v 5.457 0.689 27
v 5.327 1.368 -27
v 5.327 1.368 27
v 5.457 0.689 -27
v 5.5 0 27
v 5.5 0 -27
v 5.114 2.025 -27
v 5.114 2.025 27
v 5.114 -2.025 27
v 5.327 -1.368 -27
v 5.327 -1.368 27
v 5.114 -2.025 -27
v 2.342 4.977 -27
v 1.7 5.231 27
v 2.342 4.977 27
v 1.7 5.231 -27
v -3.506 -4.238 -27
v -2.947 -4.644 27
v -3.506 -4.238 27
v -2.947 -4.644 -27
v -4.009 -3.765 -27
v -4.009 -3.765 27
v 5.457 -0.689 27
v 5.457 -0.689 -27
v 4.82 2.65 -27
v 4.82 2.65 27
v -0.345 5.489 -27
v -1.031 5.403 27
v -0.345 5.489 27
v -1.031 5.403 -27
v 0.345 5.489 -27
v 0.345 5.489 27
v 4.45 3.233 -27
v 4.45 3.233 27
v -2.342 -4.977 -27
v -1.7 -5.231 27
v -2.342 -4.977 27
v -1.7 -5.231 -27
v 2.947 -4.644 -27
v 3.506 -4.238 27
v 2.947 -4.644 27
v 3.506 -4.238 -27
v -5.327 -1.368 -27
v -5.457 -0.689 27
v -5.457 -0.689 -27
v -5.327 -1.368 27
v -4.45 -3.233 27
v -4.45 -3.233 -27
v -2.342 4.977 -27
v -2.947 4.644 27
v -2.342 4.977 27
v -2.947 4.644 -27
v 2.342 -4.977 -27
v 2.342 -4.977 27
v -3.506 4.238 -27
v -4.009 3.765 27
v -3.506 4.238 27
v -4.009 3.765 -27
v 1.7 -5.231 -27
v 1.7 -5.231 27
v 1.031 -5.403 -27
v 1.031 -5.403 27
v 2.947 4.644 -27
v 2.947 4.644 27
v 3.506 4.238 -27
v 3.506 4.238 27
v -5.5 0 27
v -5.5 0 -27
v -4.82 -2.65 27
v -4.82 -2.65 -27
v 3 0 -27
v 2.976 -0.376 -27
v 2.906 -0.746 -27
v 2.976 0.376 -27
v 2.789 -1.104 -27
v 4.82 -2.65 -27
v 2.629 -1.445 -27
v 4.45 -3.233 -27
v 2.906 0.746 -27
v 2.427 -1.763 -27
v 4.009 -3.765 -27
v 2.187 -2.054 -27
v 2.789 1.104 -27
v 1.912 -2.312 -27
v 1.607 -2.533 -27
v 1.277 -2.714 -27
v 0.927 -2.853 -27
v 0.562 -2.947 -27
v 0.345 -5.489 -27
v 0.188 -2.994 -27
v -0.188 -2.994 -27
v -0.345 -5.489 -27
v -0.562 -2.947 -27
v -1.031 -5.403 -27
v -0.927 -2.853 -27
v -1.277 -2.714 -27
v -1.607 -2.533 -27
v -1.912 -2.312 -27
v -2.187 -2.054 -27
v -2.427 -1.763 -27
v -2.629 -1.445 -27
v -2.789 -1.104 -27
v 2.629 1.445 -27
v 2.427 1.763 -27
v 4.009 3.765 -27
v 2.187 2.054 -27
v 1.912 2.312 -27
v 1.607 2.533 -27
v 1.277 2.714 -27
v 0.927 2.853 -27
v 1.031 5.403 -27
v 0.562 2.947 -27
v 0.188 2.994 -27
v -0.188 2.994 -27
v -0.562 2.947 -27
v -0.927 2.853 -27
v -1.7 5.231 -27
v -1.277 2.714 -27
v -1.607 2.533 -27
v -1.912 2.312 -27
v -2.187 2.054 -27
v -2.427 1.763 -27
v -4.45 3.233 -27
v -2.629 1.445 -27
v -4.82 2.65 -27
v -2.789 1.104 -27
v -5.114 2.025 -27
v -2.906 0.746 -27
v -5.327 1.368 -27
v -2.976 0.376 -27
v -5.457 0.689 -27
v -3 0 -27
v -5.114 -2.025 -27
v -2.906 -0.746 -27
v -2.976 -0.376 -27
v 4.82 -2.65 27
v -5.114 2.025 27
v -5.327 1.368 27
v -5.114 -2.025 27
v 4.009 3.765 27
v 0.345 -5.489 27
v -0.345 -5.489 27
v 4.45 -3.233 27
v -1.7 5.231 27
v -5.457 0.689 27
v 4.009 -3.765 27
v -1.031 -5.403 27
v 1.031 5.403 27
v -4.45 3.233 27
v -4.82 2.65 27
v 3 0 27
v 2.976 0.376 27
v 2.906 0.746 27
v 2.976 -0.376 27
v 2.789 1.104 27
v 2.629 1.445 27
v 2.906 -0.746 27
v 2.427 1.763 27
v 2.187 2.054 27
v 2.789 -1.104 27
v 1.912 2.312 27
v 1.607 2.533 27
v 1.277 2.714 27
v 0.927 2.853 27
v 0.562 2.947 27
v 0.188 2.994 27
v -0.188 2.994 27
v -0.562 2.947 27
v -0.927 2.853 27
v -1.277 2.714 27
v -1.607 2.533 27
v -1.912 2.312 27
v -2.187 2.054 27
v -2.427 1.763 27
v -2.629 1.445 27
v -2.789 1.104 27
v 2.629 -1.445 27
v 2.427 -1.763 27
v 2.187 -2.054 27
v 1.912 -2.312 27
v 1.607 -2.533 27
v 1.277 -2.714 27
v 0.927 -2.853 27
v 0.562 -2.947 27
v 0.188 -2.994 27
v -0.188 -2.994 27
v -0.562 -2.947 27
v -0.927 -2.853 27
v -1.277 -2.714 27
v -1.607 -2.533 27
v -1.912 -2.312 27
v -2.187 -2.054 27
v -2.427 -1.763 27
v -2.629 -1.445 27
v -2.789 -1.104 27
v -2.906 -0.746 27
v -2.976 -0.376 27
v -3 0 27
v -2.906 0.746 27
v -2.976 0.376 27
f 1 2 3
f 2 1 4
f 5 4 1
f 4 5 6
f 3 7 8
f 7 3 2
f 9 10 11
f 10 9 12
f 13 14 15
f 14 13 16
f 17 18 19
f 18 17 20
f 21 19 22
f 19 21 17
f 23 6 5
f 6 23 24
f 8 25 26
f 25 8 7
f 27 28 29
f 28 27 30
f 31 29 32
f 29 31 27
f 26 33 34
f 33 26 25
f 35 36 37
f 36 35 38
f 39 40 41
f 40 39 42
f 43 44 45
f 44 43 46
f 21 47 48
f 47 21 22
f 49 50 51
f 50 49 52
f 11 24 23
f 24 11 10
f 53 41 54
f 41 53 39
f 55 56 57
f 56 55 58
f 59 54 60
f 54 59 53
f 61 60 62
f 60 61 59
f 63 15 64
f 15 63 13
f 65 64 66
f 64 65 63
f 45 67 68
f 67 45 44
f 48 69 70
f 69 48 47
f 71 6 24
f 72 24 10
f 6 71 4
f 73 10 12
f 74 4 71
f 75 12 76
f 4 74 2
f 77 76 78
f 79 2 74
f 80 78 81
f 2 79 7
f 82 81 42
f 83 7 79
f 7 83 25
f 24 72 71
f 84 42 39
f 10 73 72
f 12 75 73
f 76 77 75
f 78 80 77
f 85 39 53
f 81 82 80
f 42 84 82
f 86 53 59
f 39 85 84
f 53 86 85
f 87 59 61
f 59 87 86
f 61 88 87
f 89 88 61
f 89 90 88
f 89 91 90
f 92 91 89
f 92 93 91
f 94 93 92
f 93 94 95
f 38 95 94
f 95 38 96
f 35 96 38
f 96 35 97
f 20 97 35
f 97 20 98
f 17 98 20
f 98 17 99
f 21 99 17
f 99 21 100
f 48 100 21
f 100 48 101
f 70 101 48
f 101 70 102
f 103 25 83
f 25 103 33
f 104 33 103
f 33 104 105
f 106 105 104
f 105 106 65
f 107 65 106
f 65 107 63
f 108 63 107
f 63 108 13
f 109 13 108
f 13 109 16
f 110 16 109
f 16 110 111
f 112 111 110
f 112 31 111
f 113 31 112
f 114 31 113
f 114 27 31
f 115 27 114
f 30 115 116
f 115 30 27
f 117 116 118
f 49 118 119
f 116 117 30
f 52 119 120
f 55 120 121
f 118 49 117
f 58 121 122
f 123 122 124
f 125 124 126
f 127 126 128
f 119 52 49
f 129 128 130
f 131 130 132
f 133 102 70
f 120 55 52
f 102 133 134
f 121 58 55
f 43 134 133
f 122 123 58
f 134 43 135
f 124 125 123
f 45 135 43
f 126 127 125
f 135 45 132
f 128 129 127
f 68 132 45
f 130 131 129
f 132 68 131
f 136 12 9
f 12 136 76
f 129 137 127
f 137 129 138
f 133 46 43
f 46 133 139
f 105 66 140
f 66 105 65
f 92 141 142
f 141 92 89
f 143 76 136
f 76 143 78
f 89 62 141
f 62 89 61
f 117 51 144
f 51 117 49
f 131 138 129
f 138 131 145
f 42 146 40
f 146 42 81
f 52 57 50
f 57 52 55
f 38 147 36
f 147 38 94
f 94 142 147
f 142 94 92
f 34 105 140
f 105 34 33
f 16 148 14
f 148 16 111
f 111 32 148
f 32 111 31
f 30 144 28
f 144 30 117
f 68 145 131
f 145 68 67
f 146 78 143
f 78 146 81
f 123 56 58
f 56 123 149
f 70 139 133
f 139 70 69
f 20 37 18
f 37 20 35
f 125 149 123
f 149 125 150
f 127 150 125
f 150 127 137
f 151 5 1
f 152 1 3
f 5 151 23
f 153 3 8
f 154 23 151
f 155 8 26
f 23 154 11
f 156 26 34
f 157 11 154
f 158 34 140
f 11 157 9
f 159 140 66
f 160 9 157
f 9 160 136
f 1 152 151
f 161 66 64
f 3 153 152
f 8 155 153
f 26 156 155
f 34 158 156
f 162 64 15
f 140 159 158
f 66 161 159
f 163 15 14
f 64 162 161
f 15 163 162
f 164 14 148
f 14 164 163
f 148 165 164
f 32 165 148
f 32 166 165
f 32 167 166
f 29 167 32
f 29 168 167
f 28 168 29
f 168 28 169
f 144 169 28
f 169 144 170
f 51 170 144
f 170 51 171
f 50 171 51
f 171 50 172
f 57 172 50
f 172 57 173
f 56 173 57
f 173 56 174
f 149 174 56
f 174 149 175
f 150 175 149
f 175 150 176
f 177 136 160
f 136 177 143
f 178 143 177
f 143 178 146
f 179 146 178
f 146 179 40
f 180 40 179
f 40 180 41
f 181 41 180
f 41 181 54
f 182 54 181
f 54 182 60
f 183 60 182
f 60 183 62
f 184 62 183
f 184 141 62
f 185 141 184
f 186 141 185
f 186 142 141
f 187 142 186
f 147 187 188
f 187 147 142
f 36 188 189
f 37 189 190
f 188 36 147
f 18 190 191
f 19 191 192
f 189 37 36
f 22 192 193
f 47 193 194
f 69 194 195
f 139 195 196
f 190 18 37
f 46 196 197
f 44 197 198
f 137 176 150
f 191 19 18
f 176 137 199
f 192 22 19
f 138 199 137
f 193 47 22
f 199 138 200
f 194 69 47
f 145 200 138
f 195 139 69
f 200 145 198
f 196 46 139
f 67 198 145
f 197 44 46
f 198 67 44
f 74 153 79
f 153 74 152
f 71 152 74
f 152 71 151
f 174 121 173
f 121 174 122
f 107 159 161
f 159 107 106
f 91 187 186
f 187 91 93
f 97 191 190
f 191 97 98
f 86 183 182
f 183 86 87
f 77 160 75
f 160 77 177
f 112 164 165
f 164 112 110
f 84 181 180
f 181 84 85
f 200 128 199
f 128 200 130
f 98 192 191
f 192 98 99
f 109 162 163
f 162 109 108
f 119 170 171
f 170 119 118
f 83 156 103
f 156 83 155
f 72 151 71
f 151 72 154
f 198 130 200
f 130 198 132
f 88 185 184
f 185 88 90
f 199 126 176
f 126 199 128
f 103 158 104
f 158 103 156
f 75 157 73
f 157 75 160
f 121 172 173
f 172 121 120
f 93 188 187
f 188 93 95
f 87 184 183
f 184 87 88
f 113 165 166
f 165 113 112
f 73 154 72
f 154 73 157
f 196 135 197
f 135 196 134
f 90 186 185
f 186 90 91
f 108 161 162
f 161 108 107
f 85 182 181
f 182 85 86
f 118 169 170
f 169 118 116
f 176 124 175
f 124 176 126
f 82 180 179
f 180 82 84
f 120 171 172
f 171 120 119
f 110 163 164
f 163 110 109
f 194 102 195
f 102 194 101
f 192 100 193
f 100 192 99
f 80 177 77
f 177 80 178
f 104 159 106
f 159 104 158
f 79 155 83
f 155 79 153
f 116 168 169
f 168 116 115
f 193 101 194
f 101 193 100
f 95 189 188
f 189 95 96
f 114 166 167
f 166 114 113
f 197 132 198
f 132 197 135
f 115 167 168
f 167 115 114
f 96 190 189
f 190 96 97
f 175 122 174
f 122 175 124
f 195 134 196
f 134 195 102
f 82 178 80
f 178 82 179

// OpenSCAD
$fn = 50;


difference() {
	union() {
		translate(v = [0, 0, -27.0000000000]) {
			cylinder(h = 54, r = 5.5000000000);
		}
	}
	union() {
		translate(v = [0, 0, -100.0000000000]) {
			cylinder(h = 200, r = 3.0000000000);
		}
	}
}
